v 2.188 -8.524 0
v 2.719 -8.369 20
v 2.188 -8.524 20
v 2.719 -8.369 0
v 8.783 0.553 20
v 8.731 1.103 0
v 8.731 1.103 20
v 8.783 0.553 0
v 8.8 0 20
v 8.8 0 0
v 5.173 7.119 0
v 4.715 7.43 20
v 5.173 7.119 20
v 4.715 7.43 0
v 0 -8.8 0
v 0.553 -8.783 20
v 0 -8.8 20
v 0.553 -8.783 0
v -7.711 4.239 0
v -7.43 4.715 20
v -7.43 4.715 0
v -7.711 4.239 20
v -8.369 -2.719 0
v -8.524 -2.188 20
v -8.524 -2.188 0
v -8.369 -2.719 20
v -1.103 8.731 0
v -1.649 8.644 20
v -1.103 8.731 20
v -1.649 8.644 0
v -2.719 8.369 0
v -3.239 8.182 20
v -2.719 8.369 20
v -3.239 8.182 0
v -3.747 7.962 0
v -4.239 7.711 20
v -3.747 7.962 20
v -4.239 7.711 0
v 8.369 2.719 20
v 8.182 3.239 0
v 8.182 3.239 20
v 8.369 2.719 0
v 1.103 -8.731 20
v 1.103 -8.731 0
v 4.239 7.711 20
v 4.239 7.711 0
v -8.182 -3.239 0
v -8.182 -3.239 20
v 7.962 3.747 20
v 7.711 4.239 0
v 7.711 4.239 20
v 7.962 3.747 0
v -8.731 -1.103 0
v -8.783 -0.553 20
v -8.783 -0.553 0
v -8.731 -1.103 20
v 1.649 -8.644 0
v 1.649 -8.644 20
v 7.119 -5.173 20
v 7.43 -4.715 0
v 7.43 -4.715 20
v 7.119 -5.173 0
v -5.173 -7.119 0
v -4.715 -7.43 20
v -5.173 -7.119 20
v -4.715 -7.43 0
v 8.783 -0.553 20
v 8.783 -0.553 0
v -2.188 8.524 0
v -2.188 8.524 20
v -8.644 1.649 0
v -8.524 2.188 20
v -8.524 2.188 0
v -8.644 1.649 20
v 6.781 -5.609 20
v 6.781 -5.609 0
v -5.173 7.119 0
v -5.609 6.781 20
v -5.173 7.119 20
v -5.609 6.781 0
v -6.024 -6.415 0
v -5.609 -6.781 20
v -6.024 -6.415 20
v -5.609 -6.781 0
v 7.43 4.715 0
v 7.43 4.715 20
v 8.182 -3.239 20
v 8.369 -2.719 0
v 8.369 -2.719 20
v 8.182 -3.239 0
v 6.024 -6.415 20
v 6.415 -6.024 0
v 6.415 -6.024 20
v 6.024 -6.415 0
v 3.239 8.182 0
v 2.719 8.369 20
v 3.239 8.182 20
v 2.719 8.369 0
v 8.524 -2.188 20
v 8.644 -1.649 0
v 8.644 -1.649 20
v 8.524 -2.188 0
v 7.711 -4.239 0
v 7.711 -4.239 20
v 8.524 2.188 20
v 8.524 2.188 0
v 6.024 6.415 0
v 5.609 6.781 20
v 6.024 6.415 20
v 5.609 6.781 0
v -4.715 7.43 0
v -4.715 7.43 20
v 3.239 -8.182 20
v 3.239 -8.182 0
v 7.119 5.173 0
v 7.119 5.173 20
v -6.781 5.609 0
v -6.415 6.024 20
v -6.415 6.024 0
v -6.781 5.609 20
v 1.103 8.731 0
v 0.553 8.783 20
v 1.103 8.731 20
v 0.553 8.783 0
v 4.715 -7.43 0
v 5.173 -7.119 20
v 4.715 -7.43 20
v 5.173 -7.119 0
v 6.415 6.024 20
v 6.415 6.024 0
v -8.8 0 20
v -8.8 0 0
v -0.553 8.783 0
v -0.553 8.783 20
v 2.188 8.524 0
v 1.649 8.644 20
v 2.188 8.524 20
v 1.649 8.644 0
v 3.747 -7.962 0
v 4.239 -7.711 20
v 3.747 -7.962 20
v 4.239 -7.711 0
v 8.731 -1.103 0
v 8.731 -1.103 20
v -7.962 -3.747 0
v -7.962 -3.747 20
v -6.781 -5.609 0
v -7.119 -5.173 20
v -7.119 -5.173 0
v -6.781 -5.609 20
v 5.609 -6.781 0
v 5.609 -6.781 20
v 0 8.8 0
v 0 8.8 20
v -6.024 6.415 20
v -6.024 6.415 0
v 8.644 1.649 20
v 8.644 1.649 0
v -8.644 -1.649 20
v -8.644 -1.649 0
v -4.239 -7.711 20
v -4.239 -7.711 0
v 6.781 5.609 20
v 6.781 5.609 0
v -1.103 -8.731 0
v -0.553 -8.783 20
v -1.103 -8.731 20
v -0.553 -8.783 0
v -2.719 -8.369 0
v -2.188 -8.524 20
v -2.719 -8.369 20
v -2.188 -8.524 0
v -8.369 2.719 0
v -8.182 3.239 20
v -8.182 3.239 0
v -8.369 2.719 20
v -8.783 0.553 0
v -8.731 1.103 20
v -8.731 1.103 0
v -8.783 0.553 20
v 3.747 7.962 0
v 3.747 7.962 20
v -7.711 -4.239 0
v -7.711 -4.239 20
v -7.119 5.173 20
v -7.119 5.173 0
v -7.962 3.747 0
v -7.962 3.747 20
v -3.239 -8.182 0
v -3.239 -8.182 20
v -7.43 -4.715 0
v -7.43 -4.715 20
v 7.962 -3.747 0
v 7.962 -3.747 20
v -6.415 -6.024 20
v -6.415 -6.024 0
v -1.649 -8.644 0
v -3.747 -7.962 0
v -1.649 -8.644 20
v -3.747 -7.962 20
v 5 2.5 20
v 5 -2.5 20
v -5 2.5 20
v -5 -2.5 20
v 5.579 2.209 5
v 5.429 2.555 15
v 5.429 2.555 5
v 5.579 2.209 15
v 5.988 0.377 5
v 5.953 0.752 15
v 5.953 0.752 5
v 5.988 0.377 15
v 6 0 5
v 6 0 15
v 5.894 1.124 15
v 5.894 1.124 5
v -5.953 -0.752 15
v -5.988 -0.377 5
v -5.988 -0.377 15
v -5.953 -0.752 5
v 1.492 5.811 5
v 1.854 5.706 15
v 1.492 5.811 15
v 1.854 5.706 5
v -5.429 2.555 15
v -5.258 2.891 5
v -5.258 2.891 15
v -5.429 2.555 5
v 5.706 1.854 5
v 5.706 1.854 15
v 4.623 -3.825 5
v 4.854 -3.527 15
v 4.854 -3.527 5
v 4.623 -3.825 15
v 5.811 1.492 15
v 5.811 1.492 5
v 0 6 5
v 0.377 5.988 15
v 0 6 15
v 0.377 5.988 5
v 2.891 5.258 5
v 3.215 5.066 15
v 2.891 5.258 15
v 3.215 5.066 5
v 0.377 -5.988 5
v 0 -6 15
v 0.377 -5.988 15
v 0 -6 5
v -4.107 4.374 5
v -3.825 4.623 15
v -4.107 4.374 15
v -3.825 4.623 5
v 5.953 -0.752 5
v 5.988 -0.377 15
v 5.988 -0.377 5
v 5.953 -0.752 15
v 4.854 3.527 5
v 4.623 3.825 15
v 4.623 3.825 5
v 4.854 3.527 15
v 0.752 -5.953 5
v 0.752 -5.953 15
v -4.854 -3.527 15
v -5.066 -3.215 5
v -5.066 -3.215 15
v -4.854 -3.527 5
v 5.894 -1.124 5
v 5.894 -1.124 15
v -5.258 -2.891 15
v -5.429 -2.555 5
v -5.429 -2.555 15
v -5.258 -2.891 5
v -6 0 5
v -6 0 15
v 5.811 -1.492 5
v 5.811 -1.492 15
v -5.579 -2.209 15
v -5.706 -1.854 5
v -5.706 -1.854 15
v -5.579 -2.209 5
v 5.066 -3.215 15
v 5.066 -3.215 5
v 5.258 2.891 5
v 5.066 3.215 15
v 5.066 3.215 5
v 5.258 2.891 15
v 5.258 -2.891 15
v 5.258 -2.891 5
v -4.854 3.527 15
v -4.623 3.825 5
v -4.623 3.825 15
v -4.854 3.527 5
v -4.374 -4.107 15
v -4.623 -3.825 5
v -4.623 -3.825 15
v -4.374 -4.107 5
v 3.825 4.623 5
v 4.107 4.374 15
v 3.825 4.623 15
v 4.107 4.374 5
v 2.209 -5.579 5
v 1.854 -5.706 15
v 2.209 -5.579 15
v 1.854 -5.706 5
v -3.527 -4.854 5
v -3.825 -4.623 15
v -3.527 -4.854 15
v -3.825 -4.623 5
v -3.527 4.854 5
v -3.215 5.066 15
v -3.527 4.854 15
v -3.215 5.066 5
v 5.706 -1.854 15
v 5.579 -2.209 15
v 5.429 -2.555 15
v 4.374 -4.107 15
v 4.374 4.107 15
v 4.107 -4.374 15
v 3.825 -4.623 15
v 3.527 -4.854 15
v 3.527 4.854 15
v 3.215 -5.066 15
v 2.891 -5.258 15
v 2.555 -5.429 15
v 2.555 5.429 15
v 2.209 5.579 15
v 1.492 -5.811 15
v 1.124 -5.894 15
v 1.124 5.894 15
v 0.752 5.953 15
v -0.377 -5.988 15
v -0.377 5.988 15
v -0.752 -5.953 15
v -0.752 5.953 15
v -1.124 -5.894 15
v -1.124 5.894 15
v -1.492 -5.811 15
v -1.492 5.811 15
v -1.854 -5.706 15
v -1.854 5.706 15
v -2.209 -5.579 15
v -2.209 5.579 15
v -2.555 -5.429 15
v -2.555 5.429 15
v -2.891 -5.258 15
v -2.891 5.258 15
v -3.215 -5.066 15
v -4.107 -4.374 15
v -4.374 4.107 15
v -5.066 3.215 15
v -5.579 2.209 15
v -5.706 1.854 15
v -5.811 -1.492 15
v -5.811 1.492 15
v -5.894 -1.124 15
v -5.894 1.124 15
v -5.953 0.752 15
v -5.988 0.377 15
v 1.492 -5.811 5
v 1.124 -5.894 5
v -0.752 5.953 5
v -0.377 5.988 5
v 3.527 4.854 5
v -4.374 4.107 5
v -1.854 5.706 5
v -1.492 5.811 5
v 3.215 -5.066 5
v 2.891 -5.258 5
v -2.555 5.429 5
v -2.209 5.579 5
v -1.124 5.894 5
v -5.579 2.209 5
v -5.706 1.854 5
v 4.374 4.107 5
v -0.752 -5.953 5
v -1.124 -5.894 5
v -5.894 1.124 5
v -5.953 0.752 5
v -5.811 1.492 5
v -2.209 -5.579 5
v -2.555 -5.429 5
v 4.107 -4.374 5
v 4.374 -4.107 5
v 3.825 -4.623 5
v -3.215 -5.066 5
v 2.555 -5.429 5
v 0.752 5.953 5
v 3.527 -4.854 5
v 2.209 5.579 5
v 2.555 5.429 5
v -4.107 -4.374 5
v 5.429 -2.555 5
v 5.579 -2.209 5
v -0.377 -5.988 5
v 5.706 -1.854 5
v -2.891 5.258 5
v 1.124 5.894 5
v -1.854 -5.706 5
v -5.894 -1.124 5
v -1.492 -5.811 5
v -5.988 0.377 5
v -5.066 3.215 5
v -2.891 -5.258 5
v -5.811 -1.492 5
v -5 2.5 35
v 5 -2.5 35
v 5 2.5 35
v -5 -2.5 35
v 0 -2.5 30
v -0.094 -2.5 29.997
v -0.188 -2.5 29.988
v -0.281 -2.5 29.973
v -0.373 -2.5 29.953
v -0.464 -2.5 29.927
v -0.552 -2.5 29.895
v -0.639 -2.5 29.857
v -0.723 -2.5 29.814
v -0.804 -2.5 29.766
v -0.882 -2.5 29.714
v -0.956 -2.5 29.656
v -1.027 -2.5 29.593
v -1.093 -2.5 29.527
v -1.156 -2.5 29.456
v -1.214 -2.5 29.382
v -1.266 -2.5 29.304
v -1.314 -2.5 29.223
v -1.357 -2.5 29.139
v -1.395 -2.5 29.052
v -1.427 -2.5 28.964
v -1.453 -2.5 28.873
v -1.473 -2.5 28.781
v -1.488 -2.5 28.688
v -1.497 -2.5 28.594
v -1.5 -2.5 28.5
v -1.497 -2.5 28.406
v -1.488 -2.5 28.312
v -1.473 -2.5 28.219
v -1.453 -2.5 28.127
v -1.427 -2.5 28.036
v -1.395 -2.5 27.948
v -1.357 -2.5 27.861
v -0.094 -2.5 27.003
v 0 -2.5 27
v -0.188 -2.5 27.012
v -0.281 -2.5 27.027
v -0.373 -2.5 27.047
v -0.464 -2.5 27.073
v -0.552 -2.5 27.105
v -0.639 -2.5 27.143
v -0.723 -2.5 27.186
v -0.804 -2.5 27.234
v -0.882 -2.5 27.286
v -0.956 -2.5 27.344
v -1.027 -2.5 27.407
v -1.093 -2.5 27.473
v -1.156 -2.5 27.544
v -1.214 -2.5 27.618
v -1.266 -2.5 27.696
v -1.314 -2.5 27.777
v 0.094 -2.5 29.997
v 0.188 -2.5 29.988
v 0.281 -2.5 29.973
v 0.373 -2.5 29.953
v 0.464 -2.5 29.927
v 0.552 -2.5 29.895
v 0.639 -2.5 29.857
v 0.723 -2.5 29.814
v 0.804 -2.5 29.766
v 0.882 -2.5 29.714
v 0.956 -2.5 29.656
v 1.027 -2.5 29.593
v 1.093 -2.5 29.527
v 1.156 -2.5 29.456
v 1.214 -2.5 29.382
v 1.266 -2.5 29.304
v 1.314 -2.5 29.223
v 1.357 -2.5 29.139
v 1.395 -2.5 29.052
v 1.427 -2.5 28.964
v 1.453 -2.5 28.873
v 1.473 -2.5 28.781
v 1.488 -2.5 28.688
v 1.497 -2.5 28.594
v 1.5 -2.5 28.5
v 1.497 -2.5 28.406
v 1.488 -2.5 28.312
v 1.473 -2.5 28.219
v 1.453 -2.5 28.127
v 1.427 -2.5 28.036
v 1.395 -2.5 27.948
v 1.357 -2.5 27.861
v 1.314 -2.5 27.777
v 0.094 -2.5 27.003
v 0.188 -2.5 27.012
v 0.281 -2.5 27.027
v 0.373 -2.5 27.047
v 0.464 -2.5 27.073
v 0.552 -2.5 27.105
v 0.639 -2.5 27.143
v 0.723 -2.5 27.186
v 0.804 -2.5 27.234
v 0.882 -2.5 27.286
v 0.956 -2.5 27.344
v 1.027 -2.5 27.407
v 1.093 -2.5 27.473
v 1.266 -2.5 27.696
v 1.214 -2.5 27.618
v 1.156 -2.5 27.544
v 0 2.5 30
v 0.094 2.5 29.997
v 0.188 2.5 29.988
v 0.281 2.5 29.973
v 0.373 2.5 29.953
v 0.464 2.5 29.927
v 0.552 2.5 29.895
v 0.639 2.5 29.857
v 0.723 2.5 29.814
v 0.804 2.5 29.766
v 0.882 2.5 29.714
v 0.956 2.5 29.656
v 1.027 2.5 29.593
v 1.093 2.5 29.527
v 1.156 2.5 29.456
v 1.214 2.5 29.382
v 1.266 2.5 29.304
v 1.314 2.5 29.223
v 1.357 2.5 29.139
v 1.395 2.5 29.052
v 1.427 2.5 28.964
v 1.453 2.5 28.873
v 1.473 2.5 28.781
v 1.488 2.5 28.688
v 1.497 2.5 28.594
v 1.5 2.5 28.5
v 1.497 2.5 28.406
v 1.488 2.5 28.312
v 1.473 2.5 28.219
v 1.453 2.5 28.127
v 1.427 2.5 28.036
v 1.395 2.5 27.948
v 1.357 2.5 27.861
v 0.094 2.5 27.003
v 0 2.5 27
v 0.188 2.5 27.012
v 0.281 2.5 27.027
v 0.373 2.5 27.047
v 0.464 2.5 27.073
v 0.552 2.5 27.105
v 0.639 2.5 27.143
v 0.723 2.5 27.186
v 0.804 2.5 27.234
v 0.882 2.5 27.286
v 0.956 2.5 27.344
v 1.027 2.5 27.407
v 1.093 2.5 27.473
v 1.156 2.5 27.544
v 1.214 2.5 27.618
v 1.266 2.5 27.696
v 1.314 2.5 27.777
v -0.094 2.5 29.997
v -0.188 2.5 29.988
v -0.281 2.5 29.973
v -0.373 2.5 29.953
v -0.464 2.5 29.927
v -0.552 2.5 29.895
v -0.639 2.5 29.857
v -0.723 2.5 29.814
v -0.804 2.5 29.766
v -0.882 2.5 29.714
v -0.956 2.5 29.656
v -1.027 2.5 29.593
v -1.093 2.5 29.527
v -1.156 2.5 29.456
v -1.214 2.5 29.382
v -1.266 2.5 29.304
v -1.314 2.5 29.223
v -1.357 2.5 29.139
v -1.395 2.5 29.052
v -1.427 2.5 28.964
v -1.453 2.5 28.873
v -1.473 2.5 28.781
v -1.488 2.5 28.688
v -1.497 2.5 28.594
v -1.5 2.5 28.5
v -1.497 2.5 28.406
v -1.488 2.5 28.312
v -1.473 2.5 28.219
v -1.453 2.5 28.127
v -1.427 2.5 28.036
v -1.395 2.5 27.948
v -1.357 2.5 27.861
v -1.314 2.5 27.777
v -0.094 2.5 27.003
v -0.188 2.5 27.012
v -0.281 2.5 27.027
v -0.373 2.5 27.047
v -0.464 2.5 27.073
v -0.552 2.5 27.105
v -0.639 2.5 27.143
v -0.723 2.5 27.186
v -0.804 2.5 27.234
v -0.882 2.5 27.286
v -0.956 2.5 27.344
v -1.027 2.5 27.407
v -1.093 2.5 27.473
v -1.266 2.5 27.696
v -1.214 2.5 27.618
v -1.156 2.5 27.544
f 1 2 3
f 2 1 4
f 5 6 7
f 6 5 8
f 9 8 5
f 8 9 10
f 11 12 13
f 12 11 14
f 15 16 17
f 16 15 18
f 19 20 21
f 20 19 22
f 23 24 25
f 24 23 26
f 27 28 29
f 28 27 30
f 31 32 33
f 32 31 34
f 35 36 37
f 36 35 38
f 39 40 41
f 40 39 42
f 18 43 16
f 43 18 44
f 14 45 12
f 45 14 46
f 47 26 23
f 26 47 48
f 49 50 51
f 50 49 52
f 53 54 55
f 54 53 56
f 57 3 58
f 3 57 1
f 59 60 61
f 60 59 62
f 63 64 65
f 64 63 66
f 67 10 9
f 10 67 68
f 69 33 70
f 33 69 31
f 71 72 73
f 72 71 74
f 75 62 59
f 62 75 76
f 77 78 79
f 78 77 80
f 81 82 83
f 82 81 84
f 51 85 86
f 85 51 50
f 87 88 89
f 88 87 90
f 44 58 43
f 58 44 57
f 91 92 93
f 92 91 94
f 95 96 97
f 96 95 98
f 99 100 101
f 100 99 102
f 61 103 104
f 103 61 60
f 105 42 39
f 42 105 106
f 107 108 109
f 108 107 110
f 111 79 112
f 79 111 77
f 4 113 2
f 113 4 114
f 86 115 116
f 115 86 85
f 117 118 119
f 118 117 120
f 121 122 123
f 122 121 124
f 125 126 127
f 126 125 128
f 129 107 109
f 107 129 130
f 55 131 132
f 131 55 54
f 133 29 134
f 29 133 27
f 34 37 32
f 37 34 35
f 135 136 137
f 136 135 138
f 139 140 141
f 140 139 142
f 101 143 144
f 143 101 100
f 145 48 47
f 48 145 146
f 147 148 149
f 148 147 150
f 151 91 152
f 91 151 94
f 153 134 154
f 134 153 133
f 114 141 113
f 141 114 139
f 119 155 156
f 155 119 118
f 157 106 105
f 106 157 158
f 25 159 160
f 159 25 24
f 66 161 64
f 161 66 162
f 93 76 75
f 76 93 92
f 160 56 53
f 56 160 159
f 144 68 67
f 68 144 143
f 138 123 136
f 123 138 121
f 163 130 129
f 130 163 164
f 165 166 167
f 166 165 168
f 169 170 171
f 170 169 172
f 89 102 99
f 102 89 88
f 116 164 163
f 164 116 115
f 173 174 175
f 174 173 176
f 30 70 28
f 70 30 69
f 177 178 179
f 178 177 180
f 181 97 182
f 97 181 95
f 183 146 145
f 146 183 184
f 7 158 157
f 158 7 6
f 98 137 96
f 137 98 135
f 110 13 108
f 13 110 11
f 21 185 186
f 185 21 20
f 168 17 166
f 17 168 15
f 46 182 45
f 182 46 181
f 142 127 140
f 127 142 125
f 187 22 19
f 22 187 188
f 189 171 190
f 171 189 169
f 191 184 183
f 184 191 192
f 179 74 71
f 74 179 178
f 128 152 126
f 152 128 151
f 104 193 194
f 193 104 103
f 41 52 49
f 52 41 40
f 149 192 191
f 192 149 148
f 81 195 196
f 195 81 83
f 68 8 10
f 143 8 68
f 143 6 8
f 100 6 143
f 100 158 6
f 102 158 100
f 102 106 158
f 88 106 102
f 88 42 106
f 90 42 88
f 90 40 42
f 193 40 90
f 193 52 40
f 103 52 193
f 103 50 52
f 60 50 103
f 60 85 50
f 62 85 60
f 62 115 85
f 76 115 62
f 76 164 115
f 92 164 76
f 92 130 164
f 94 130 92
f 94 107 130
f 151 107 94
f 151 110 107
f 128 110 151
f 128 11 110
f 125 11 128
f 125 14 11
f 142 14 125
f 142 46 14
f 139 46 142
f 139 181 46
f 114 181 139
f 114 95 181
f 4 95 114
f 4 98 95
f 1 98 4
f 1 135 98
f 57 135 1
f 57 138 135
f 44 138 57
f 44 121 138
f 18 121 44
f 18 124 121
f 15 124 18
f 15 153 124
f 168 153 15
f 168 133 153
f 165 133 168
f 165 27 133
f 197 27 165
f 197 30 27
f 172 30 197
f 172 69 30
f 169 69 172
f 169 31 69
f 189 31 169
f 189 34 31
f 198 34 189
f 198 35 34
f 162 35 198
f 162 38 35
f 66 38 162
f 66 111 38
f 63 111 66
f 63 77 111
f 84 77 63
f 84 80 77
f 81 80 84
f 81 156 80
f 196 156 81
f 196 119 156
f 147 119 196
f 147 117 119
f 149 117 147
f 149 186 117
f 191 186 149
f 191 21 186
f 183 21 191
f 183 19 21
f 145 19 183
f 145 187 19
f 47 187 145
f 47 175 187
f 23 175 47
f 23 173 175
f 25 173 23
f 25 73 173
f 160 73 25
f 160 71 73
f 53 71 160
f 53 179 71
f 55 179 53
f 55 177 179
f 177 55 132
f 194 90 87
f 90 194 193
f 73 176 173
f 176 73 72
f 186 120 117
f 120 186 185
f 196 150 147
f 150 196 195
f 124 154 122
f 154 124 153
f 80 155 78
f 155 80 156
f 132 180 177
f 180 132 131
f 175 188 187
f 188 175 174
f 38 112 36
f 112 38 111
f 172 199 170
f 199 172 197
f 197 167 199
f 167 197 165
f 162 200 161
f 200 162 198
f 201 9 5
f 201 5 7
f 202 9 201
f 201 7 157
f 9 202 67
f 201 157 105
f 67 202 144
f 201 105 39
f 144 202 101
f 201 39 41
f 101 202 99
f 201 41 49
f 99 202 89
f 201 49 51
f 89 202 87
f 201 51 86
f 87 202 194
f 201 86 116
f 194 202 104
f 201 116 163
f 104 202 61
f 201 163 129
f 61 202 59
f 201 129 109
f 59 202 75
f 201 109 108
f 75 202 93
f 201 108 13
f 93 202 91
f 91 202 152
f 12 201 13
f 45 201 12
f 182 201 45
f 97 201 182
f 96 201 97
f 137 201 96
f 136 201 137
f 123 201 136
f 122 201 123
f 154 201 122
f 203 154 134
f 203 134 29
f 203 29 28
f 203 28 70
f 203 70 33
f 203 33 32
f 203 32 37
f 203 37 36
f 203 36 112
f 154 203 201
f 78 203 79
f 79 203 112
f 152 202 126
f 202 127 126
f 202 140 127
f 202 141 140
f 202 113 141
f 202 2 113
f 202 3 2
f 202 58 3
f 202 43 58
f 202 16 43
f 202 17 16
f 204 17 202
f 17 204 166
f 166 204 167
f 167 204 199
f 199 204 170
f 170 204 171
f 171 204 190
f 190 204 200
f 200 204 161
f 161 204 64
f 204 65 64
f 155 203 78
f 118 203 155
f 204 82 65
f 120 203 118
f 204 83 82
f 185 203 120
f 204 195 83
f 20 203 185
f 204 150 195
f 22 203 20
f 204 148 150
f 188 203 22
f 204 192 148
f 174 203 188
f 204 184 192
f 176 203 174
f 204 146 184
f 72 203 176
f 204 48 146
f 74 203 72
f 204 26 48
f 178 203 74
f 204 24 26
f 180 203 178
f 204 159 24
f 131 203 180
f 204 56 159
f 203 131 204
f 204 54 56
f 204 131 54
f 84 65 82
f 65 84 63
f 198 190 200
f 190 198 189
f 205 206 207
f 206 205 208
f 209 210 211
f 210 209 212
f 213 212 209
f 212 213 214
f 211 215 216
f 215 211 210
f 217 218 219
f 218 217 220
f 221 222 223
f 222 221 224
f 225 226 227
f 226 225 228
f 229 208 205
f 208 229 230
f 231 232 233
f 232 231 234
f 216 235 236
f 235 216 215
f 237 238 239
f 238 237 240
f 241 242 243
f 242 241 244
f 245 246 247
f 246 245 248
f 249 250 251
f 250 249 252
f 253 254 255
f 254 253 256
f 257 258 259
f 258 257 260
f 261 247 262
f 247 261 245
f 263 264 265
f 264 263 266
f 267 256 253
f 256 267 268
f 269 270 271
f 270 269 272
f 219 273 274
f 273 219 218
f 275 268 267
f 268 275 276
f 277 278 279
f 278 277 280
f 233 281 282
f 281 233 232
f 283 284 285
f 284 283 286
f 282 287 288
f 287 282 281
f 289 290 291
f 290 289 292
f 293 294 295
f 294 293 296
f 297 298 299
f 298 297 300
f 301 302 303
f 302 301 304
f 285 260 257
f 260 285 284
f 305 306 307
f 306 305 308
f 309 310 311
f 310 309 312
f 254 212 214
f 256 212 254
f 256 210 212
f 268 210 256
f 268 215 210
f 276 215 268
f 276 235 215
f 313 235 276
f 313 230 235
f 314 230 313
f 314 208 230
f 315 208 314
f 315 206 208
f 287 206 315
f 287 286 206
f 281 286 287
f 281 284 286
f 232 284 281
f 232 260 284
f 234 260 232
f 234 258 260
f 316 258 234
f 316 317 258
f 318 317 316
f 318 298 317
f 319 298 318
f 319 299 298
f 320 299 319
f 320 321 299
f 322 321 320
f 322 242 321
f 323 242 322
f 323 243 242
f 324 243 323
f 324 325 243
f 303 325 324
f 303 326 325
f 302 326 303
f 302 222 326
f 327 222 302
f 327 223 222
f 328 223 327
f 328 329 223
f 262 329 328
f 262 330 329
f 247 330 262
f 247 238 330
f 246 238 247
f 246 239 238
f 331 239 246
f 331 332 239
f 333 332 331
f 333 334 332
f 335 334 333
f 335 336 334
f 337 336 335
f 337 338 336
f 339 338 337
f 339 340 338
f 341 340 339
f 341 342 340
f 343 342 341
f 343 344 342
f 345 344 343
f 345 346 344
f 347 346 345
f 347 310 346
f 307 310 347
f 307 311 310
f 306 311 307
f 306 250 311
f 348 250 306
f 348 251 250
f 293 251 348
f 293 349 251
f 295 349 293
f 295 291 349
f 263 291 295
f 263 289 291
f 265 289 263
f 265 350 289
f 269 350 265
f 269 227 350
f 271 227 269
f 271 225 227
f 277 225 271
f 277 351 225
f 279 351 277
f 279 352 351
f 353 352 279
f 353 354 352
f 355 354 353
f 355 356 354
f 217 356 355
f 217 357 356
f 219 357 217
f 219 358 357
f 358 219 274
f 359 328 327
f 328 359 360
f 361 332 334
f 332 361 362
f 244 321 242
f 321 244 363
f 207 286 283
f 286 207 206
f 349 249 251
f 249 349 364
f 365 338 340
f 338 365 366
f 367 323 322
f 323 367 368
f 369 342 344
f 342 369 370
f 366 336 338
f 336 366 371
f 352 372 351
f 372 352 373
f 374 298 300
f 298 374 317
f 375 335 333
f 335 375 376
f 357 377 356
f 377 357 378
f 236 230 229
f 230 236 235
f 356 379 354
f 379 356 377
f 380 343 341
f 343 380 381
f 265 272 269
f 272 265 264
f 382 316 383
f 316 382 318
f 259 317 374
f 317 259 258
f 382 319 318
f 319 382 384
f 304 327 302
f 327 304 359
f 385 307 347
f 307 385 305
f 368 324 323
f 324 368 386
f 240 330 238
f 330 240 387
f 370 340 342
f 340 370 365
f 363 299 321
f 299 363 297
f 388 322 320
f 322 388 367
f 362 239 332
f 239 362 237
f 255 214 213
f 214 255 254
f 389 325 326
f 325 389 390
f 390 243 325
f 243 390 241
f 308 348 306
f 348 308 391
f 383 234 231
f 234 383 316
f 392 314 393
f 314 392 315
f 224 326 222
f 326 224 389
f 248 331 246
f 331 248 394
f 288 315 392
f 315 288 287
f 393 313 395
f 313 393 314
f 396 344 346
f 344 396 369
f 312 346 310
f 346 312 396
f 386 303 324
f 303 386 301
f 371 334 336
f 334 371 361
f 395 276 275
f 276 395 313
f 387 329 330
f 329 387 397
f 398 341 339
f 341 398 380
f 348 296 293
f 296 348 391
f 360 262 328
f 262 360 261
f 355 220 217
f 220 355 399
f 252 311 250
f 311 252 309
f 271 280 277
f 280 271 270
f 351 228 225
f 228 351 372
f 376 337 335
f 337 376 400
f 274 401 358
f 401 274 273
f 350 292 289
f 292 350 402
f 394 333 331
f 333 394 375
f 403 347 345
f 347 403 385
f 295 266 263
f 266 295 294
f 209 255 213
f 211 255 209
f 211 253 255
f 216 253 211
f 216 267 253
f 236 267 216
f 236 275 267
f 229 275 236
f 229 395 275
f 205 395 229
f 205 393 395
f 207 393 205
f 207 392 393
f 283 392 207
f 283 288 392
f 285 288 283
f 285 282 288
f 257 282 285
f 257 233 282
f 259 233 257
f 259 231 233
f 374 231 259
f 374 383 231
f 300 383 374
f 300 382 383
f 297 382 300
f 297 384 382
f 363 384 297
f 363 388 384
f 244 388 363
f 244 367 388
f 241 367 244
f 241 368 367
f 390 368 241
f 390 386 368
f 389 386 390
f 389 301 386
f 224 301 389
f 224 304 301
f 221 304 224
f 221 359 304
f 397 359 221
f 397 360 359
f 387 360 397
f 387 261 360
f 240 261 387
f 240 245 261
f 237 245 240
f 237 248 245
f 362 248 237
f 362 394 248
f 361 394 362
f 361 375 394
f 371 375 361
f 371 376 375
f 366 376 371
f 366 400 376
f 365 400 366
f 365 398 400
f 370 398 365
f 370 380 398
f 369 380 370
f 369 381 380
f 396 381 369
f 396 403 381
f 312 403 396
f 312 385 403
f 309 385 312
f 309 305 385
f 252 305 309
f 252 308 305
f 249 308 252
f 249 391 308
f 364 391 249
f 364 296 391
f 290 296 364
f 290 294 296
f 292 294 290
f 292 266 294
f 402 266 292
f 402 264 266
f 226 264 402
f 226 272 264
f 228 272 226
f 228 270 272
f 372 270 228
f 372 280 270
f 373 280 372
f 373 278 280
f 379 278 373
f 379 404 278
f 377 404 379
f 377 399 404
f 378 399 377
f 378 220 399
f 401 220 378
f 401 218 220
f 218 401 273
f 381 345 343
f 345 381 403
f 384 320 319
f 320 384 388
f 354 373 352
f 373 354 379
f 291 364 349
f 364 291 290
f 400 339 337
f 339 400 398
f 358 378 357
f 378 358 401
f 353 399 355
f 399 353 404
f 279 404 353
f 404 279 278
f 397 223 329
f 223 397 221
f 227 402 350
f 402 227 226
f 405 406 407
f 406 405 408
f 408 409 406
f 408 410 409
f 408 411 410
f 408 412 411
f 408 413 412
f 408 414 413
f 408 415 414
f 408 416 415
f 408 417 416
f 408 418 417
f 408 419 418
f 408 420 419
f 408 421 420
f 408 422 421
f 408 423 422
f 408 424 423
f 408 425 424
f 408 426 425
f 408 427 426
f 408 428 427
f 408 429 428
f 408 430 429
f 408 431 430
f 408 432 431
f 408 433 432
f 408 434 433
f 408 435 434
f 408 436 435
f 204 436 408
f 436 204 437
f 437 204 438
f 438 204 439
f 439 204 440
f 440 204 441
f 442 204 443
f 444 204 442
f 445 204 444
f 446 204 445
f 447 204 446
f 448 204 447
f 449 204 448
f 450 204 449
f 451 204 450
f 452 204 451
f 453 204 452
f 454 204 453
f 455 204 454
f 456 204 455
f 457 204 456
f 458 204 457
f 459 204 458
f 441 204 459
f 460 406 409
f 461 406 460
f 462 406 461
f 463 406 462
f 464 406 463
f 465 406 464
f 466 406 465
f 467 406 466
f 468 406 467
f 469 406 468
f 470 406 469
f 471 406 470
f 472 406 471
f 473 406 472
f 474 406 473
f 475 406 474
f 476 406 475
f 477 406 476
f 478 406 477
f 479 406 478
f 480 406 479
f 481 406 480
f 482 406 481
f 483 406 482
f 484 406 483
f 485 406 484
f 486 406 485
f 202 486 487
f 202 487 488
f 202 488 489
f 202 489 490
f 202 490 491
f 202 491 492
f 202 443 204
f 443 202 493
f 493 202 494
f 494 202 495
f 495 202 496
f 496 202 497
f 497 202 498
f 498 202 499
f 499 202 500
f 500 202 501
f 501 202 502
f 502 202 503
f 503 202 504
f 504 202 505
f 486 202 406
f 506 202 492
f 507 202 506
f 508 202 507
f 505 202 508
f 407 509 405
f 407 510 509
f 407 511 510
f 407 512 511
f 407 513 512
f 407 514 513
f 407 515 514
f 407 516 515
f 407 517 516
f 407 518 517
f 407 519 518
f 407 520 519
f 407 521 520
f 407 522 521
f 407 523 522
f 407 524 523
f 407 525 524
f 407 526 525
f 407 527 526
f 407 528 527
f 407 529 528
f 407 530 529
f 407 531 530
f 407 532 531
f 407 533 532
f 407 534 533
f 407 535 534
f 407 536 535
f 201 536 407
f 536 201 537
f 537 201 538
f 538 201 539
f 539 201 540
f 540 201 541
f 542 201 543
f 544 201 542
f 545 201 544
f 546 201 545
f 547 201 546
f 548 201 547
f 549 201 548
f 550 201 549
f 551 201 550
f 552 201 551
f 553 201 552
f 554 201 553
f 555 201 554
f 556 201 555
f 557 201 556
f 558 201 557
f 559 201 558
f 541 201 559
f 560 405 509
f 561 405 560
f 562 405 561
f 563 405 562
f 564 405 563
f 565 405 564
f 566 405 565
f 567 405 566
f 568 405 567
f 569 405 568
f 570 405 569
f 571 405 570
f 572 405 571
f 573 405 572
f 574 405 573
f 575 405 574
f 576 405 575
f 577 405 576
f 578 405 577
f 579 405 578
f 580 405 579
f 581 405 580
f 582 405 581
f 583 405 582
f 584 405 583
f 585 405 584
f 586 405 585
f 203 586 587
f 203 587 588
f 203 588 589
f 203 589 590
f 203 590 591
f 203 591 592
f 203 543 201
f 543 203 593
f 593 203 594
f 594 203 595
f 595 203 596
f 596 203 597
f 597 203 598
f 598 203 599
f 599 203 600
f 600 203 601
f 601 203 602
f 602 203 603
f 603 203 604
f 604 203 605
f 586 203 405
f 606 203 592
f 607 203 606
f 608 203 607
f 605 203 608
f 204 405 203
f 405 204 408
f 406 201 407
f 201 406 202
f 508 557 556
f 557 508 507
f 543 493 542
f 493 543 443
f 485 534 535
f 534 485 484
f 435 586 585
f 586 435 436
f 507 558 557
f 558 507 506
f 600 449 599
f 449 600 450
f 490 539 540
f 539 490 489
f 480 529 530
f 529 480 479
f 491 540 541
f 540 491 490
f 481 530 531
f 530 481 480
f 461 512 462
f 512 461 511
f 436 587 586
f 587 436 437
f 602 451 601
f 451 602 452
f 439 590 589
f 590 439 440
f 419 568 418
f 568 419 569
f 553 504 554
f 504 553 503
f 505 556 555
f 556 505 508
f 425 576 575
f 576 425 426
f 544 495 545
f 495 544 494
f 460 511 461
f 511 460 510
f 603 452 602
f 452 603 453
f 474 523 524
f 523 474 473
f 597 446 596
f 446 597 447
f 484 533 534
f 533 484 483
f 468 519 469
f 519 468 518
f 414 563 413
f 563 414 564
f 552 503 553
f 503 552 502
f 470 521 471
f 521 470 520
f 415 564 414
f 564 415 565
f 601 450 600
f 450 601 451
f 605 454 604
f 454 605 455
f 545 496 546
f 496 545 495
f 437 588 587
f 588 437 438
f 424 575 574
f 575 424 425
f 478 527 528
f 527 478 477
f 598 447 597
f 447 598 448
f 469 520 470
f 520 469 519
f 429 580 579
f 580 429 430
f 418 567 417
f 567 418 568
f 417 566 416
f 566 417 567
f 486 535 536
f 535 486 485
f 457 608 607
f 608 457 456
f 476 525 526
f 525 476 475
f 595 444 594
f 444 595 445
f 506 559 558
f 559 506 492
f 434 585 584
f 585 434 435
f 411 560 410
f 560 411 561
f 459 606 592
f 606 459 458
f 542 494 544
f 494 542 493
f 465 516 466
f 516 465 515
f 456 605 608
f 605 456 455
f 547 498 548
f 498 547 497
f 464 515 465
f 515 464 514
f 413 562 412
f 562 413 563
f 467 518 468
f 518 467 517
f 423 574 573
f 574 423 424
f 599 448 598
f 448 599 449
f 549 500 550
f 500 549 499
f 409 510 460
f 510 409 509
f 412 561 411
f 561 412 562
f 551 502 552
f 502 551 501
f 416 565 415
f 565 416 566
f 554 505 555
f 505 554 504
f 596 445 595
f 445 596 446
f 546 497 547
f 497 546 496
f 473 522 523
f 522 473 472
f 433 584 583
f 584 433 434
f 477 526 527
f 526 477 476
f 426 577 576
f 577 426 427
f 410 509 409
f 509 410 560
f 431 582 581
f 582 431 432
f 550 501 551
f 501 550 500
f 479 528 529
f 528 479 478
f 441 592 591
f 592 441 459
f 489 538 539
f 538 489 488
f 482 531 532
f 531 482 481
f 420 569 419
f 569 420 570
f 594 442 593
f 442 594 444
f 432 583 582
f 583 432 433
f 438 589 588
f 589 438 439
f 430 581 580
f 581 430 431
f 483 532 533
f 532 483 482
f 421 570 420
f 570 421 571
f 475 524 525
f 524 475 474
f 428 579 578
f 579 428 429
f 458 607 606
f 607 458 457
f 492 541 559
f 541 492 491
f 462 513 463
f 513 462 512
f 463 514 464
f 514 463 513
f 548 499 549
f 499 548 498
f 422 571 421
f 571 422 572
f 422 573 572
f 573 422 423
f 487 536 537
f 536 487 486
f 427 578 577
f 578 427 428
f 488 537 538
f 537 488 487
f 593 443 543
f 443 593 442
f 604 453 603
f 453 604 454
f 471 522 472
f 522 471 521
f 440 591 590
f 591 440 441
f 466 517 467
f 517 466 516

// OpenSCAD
//*******************************************************
// ********** Prusa Rounded Clip by MacFly **************
// **            made dec 02 2015                      **
//*******************************************************

//--------------------------------------------------------------------------------------//
$fn = 100;

CYLINDER_HEIGHT = 20;         // cylinder height mm - Hauteur du cylindre en mm
CYLINDER_RADIUS = 8.80;      // cylinder radius mm - Rayon du cylindre en mm
TAB_LENGTH = 15;            //  Tab length - longueur de la languette en mm
TAB_THICKNESS = 5;         // 5mm thickness - Epaisseur de la languette
TAB_WIDTH = 10;           // Tab width mm - Largeur de la languette en mm
SCREW_HOLE_RADIUS = 1.5; // screw hole radius - Diamètre du trou pour la vis
SCREW_HOLE_OFFSET = 5; // tab screw hole 5mm from the edge - distance du trou 5mm du bord extérieur
EXTRUSION_THICKNESS = 6; // 8.80 - 6 = 2.8 / 2 = 1.4mm shell thickness - Epaisseur de l'extrusion intérieur du cylindre

module cylindre()
    {
    difference()
        {
                cylinder(r=CYLINDER_RADIUS, h=CYLINDER_HEIGHT);
                translate([0,0,5]) extruCylinder();
        }
    }
    
module extruCylinder()
    {
                #cylinder(r=EXTRUSION_THICKNESS, h=CYLINDER_HEIGHT - 10);  
    }
    
module  tab()
    {
     difference() {
                  
            translate([0,0,0]) rotate([90,90,0]) cube([TAB_LENGTH,TAB_WIDTH,TAB_THICKNESS]);
            translate([5, 75, -SCREW_HOLE_OFFSET - 1.5]) rotate([90,90,0]) #cylinder(r=SCREW_HOLE_RADIUS,h=150);
     }
  }

cylindre();
translate([-TAB_WIDTH/2,TAB_THICKNESS/2,CYLINDER_HEIGHT + TAB_LENGTH]) tab();
